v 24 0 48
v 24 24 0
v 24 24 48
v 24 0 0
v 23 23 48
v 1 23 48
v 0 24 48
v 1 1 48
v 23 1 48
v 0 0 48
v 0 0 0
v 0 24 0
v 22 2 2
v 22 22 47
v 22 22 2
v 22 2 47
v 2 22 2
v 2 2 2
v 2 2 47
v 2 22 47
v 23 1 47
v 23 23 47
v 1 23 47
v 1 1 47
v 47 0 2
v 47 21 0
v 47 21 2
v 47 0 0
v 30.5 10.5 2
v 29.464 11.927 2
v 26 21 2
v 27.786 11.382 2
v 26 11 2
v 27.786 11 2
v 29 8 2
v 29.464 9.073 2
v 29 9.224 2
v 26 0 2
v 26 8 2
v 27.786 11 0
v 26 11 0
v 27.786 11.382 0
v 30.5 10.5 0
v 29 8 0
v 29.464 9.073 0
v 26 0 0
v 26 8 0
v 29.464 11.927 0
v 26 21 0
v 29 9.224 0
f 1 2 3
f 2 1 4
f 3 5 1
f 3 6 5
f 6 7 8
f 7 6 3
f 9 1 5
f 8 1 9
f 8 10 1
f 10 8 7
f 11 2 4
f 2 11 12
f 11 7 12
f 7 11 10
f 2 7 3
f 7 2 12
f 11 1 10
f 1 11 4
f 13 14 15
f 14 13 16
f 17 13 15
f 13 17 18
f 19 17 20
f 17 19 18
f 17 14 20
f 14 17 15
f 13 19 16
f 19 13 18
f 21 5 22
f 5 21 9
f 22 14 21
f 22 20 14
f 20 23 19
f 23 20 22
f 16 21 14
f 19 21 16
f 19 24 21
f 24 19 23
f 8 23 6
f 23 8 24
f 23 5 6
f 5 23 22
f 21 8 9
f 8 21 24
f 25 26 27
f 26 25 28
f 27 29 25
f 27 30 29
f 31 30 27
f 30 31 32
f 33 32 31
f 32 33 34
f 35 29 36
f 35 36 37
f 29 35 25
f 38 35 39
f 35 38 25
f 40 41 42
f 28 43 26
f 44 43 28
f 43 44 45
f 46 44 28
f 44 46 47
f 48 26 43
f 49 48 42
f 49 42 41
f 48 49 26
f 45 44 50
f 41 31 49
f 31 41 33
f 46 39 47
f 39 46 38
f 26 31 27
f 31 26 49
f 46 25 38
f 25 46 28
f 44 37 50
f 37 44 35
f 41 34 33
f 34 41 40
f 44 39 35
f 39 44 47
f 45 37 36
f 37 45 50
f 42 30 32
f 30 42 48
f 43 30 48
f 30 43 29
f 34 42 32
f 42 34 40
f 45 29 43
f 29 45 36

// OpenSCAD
difference(){
    cube([24, 24, 48]);
    translate([2, 2, 2]){
        cube([20, 20, 48]);
    }
    translate([1, 1, 47]){
        cube([22, 22, 3]);
    }
}

translate([26, 0, 0]){
    difference(){
        cube([21, 21, 2]);
        translate([0, 8, -1]){
            cube([3, 3, 4]);
        }
        translate([3, 10.5, -1]){
            cylinder(r=1.5, h=4);
        }
    }
}
